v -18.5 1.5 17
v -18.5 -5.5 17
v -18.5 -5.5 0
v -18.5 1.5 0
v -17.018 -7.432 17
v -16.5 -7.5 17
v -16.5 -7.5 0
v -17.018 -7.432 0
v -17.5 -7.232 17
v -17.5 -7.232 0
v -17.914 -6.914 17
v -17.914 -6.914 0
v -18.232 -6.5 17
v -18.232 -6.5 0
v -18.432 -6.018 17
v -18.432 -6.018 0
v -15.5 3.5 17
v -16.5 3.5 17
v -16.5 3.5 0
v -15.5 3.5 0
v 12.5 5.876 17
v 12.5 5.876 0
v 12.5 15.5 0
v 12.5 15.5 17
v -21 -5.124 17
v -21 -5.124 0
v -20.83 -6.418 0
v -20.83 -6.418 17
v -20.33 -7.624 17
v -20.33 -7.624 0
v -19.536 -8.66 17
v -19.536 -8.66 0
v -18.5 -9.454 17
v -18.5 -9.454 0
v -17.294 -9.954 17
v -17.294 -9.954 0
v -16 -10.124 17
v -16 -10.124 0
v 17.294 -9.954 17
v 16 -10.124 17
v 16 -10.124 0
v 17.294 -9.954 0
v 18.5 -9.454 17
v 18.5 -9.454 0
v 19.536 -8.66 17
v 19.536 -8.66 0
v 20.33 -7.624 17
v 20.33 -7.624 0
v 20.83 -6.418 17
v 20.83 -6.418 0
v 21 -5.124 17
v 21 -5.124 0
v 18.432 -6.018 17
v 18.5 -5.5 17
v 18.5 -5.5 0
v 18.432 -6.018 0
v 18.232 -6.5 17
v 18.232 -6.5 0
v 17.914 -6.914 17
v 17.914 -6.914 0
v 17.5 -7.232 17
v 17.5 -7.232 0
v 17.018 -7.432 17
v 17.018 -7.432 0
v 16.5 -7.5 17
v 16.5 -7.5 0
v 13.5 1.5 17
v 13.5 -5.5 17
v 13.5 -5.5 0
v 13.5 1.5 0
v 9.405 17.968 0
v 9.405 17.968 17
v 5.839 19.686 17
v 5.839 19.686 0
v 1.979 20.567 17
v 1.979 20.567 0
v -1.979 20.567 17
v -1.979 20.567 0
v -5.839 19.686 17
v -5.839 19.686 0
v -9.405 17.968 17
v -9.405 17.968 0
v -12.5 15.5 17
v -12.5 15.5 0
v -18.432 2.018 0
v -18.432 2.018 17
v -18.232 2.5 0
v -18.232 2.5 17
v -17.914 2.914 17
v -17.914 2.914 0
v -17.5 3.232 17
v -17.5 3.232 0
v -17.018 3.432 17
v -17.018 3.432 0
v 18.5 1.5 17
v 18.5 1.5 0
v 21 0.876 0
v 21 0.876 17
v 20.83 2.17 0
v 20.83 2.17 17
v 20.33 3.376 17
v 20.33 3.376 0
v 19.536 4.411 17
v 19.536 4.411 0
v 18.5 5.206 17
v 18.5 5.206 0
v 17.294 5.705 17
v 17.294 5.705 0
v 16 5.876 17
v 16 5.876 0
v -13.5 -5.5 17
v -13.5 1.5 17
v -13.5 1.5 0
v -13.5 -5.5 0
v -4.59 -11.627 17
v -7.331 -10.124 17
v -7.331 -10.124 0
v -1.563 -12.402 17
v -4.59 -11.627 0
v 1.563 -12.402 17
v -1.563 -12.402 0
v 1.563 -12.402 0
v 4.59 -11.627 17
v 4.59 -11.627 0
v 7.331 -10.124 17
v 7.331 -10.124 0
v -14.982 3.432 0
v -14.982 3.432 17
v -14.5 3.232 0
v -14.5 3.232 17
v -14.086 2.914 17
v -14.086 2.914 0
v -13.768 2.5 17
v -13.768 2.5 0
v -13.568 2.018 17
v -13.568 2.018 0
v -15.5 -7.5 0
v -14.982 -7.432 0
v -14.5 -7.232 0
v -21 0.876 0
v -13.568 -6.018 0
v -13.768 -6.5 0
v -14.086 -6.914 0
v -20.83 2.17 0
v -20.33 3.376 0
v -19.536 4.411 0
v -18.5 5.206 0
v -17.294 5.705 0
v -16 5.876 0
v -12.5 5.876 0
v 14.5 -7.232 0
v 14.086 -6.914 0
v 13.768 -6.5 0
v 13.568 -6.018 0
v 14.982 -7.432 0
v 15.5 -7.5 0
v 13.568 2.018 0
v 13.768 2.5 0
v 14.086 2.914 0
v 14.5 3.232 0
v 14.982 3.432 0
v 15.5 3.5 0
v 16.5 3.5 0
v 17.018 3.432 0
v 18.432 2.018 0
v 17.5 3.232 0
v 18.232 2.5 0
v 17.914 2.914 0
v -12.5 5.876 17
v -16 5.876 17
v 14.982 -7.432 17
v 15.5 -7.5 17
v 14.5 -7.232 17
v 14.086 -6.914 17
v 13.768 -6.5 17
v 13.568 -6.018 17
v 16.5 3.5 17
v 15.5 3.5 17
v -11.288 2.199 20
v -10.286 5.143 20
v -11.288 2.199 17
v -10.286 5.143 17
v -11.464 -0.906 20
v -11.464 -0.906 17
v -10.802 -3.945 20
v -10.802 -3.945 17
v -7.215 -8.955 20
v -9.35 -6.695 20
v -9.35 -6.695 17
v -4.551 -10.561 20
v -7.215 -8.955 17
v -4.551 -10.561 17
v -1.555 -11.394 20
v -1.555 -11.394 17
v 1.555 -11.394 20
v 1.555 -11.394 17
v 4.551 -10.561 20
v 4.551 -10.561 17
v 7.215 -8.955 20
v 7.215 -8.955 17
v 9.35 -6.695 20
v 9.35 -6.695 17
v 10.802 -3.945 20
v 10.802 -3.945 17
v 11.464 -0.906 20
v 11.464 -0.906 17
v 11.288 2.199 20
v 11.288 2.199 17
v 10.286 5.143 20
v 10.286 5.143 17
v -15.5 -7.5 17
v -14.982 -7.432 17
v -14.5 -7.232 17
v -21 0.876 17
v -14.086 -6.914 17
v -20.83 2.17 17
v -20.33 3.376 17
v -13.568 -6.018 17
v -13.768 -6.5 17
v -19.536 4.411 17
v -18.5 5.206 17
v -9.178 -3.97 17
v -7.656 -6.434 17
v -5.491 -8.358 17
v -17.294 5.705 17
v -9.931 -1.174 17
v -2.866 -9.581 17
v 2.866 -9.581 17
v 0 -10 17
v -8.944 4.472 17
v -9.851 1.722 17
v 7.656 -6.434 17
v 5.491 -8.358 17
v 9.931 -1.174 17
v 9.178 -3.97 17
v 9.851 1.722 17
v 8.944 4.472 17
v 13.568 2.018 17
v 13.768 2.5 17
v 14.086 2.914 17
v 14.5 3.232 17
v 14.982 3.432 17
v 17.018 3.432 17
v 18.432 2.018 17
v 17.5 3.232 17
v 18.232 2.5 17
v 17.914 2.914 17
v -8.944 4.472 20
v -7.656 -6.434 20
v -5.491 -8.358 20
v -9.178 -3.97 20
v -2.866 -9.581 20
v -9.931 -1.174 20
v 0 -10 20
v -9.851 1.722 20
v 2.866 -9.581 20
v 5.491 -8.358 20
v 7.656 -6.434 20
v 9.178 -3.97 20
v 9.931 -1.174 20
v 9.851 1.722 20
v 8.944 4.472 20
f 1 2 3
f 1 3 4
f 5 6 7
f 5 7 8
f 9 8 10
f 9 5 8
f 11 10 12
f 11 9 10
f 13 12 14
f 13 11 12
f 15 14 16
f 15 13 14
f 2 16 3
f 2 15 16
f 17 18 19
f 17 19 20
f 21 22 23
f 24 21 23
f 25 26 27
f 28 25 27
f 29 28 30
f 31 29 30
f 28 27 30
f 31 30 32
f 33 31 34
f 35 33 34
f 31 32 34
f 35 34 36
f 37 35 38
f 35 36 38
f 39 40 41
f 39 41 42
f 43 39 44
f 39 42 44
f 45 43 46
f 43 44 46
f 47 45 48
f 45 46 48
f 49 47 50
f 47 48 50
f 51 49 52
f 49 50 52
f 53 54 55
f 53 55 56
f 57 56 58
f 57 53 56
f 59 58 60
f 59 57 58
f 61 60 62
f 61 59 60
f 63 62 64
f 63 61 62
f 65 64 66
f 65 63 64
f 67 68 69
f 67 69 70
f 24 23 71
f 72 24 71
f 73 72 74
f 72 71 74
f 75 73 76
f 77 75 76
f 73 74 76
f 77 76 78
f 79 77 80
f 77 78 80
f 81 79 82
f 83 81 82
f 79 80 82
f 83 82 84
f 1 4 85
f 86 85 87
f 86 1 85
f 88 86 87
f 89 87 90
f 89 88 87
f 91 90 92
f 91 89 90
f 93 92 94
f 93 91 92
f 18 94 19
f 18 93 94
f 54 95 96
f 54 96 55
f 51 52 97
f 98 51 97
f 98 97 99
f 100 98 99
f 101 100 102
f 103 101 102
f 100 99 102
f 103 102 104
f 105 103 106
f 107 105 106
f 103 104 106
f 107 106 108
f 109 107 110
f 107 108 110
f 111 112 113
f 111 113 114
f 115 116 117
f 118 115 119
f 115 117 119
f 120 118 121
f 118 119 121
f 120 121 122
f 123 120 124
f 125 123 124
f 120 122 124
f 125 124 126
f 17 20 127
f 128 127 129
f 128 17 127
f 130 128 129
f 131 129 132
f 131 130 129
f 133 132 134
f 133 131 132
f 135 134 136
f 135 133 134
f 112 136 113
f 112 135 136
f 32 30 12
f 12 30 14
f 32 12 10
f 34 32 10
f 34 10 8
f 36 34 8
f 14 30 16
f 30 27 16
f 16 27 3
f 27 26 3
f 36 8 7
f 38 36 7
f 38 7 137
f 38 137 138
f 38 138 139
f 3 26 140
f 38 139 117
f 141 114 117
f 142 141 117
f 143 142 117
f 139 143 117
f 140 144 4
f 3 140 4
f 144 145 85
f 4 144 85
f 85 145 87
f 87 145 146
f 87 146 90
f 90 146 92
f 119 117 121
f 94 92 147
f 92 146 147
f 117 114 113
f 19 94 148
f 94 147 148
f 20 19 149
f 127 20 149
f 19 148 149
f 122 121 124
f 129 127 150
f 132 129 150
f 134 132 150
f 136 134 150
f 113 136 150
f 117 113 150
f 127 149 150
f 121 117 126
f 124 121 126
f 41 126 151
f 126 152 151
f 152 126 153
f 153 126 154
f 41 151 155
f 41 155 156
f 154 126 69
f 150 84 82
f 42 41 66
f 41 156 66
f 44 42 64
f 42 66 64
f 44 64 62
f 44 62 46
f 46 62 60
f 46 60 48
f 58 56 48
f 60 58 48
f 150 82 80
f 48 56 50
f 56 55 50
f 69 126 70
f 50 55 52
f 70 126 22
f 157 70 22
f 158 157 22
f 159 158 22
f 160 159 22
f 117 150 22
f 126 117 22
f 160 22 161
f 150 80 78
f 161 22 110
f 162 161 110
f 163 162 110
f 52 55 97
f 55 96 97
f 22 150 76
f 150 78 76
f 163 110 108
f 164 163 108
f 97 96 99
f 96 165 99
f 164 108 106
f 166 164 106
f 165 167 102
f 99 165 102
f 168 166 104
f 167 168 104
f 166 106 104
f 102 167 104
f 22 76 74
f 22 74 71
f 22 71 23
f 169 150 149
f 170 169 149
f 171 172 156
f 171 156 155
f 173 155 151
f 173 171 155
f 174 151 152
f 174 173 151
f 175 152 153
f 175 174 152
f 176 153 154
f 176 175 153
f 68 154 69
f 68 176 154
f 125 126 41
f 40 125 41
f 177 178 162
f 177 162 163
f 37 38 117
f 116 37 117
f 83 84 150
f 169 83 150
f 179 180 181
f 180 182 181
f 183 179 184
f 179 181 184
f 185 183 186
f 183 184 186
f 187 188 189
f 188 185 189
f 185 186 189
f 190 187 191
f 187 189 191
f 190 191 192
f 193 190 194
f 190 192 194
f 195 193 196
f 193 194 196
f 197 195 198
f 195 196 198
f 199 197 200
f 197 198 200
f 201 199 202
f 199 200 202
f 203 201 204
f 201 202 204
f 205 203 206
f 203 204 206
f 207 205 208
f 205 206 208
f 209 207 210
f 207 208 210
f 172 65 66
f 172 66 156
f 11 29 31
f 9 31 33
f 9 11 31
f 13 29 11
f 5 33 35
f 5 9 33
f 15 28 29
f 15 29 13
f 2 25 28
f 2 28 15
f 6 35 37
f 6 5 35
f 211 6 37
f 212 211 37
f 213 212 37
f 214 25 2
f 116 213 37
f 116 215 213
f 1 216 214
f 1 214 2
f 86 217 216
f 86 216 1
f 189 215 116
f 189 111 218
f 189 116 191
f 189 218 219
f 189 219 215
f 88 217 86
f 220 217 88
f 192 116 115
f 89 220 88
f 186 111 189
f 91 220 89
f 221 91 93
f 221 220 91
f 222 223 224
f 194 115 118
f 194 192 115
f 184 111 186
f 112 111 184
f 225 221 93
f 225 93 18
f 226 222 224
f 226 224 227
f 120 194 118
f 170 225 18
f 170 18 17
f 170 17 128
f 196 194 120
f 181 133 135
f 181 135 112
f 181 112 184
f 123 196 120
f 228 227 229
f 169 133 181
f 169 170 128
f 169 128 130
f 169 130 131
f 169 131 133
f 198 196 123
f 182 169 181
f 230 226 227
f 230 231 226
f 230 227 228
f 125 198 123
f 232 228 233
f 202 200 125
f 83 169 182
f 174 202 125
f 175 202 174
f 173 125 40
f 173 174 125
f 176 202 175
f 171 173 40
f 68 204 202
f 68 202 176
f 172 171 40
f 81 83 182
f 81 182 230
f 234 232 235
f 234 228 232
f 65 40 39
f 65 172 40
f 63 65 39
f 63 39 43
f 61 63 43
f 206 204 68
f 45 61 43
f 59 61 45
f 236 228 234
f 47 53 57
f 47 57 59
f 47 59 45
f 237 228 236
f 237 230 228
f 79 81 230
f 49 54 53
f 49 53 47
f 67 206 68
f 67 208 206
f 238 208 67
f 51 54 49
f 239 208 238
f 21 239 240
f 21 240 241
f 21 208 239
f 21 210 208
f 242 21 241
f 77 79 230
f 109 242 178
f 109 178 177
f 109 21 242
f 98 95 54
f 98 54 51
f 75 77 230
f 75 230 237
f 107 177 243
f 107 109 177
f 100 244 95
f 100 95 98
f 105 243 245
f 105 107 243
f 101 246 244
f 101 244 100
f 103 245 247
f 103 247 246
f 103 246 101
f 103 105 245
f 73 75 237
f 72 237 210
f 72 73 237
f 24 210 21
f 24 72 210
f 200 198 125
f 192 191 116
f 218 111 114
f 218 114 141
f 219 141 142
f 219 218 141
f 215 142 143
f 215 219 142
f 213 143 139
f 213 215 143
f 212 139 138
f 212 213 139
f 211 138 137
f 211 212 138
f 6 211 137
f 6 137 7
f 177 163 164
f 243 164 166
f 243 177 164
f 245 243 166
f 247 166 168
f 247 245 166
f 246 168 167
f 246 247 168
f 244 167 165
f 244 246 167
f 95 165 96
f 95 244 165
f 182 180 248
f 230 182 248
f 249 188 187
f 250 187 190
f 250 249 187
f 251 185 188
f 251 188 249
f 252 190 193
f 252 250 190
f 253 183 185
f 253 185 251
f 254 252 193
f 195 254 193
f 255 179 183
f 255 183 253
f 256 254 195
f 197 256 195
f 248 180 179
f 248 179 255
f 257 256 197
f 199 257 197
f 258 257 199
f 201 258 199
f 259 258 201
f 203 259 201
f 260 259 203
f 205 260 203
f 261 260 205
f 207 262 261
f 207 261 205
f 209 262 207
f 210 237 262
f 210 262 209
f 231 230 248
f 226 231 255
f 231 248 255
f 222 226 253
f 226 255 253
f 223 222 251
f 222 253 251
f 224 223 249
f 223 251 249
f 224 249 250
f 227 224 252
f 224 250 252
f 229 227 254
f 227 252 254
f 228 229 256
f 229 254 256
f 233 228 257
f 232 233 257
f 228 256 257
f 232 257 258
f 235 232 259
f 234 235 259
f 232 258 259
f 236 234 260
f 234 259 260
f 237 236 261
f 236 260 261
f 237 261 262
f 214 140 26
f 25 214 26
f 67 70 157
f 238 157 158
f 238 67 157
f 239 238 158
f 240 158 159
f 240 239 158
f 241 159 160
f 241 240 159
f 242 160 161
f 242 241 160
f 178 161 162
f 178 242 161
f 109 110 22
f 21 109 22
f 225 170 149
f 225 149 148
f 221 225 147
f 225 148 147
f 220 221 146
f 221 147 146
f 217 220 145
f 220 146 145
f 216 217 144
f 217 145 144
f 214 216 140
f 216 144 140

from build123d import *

# Parameters (mm, degrees)
BASE_EXTRUSION_DEPTH    = 17
ENL_V_MAT_EXTRU_1_DEPTH = 17
ESQUISSE3_R             = 11.5
BOSS_EXTRU_1_DEPTH      = 3
ESQUISSE4_R             = 10
ENL_V_MAT_EXTRU_2_DEPTH = 3
ENL_V_MAT_EXTRU_3_DEPTH = 3


with BuildPart() as part:
    # Esquisse1 → Base-Extrusion (new body)
    with BuildSketch(Plane.XY):
        with BuildLine():
            Line((-16, -10.124371965), (-7.331240844, -10.124371965))
            ThreePointArc((-7.331240844, -10.124371965), (0, -12.5), (7.331240844, -10.124371965))
            Line((7.331240844, -10.124371965), (16, -10.124371965))
            ThreePointArc((16, -10.124371965), (19.535533906, -8.659905871), (21, -5.124371965))
            Line((21, -5.124371965), (21, 0.875628035))
            ThreePointArc((21, 0.875628035), (19.535533906, 4.411161941), (16, 5.875628035))
            Line((16, 5.875628035), (12.5, 5.875628035))
            Line((12.5, 5.875628035), (12.5, 15.5))
            ThreePointArc((12.5, 15.5), (0, 20.67766953), (-12.5, 15.5))
            Line((-12.5, 15.5), (-12.5, 5.875628035))
            Line((-12.5, 5.875628035), (-16, 5.875628035))
            ThreePointArc((-16, 5.875628035), (-19.535533906, 4.411161941), (-21, 0.875628035))
            Line((-21, 0.875628035), (-21, -5.124371965))
            ThreePointArc((-21, -5.124371965), (-19.535533906, -8.659905871), (-16, -10.124371965))
        make_face()
    extrude(amount=BASE_EXTRUSION_DEPTH)

    # Esquisse2 → Enlèv. mat.-Extru.1 (cut)
    with BuildSketch(Plane.XY.offset(17)):
        with BuildLine():
            Line((-16.5, 3.5), (-15.5, 3.5))
            ThreePointArc((-15.5, 3.5), (-14.085786438, 2.914213562), (-13.5, 1.5))
            Line((-13.5, 1.5), (-13.5, -5.5))
            ThreePointArc((-13.5, -5.5), (-14.085786438, -6.914213562), (-15.5, -7.5))
            Line((-15.5, -7.5), (-16.5, -7.5))
            ThreePointArc((-16.5, -7.5), (-17.914213562, -6.914213562), (-18.5, -5.5))
            Line((-18.5, -5.5), (-18.5, 1.5))
            ThreePointArc((-18.5, 1.5), (-17.914213562, 2.914213562), (-16.5, 3.5))
        make_face()
        with BuildLine():
            Line((15.5, 3.5), (16.5, 3.5))
            ThreePointArc((16.5, 3.5), (17.914213562, 2.914213562), (18.5, 1.5))
            Line((18.5, 1.5), (18.5, -5.5))
            ThreePointArc((18.5, -5.5), (17.914213562, -6.914213562), (16.5, -7.5))
            Line((16.5, -7.5), (15.5, -7.5))
            ThreePointArc((15.5, -7.5), (14.085786438, -6.914213562), (13.5, -5.5))
            Line((13.5, -5.5), (13.5, 1.5))
            ThreePointArc((13.5, 1.5), (14.085786438, 2.914213562), (15.5, 3.5))
        make_face()
    extrude(amount=-ENL_V_MAT_EXTRU_1_DEPTH, mode=Mode.SUBTRACT)

    # Esquisse3 → Boss.-Extru.1 (add)
    with BuildSketch(Plane.XY.offset(17)):
        Circle(ESQUISSE3_R)
    extrude(amount=BOSS_EXTRU_1_DEPTH)

    # Esquisse4 → Enlèv. mat.-Extru.2 (cut)
    with BuildSketch(Plane.XY.offset(20)):
        Circle(ESQUISSE4_R)
    extrude(amount=-ENL_V_MAT_EXTRU_2_DEPTH, mode=Mode.SUBTRACT)

    # Esquisse5 → Enlèv. mat.-Extru.3 (cut)
    with BuildSketch(Plane.XY.offset(20)):
        with BuildLine():
            Line((-20, 10), (0, 0))
            Line((0, 0), (20, 10))
            ThreePointArc((20, 10), (0, 22.360679775), (-20, 10))
        make_face()
    extrude(amount=-ENL_V_MAT_EXTRU_3_DEPTH, mode=Mode.SUBTRACT)


solid = part.part
